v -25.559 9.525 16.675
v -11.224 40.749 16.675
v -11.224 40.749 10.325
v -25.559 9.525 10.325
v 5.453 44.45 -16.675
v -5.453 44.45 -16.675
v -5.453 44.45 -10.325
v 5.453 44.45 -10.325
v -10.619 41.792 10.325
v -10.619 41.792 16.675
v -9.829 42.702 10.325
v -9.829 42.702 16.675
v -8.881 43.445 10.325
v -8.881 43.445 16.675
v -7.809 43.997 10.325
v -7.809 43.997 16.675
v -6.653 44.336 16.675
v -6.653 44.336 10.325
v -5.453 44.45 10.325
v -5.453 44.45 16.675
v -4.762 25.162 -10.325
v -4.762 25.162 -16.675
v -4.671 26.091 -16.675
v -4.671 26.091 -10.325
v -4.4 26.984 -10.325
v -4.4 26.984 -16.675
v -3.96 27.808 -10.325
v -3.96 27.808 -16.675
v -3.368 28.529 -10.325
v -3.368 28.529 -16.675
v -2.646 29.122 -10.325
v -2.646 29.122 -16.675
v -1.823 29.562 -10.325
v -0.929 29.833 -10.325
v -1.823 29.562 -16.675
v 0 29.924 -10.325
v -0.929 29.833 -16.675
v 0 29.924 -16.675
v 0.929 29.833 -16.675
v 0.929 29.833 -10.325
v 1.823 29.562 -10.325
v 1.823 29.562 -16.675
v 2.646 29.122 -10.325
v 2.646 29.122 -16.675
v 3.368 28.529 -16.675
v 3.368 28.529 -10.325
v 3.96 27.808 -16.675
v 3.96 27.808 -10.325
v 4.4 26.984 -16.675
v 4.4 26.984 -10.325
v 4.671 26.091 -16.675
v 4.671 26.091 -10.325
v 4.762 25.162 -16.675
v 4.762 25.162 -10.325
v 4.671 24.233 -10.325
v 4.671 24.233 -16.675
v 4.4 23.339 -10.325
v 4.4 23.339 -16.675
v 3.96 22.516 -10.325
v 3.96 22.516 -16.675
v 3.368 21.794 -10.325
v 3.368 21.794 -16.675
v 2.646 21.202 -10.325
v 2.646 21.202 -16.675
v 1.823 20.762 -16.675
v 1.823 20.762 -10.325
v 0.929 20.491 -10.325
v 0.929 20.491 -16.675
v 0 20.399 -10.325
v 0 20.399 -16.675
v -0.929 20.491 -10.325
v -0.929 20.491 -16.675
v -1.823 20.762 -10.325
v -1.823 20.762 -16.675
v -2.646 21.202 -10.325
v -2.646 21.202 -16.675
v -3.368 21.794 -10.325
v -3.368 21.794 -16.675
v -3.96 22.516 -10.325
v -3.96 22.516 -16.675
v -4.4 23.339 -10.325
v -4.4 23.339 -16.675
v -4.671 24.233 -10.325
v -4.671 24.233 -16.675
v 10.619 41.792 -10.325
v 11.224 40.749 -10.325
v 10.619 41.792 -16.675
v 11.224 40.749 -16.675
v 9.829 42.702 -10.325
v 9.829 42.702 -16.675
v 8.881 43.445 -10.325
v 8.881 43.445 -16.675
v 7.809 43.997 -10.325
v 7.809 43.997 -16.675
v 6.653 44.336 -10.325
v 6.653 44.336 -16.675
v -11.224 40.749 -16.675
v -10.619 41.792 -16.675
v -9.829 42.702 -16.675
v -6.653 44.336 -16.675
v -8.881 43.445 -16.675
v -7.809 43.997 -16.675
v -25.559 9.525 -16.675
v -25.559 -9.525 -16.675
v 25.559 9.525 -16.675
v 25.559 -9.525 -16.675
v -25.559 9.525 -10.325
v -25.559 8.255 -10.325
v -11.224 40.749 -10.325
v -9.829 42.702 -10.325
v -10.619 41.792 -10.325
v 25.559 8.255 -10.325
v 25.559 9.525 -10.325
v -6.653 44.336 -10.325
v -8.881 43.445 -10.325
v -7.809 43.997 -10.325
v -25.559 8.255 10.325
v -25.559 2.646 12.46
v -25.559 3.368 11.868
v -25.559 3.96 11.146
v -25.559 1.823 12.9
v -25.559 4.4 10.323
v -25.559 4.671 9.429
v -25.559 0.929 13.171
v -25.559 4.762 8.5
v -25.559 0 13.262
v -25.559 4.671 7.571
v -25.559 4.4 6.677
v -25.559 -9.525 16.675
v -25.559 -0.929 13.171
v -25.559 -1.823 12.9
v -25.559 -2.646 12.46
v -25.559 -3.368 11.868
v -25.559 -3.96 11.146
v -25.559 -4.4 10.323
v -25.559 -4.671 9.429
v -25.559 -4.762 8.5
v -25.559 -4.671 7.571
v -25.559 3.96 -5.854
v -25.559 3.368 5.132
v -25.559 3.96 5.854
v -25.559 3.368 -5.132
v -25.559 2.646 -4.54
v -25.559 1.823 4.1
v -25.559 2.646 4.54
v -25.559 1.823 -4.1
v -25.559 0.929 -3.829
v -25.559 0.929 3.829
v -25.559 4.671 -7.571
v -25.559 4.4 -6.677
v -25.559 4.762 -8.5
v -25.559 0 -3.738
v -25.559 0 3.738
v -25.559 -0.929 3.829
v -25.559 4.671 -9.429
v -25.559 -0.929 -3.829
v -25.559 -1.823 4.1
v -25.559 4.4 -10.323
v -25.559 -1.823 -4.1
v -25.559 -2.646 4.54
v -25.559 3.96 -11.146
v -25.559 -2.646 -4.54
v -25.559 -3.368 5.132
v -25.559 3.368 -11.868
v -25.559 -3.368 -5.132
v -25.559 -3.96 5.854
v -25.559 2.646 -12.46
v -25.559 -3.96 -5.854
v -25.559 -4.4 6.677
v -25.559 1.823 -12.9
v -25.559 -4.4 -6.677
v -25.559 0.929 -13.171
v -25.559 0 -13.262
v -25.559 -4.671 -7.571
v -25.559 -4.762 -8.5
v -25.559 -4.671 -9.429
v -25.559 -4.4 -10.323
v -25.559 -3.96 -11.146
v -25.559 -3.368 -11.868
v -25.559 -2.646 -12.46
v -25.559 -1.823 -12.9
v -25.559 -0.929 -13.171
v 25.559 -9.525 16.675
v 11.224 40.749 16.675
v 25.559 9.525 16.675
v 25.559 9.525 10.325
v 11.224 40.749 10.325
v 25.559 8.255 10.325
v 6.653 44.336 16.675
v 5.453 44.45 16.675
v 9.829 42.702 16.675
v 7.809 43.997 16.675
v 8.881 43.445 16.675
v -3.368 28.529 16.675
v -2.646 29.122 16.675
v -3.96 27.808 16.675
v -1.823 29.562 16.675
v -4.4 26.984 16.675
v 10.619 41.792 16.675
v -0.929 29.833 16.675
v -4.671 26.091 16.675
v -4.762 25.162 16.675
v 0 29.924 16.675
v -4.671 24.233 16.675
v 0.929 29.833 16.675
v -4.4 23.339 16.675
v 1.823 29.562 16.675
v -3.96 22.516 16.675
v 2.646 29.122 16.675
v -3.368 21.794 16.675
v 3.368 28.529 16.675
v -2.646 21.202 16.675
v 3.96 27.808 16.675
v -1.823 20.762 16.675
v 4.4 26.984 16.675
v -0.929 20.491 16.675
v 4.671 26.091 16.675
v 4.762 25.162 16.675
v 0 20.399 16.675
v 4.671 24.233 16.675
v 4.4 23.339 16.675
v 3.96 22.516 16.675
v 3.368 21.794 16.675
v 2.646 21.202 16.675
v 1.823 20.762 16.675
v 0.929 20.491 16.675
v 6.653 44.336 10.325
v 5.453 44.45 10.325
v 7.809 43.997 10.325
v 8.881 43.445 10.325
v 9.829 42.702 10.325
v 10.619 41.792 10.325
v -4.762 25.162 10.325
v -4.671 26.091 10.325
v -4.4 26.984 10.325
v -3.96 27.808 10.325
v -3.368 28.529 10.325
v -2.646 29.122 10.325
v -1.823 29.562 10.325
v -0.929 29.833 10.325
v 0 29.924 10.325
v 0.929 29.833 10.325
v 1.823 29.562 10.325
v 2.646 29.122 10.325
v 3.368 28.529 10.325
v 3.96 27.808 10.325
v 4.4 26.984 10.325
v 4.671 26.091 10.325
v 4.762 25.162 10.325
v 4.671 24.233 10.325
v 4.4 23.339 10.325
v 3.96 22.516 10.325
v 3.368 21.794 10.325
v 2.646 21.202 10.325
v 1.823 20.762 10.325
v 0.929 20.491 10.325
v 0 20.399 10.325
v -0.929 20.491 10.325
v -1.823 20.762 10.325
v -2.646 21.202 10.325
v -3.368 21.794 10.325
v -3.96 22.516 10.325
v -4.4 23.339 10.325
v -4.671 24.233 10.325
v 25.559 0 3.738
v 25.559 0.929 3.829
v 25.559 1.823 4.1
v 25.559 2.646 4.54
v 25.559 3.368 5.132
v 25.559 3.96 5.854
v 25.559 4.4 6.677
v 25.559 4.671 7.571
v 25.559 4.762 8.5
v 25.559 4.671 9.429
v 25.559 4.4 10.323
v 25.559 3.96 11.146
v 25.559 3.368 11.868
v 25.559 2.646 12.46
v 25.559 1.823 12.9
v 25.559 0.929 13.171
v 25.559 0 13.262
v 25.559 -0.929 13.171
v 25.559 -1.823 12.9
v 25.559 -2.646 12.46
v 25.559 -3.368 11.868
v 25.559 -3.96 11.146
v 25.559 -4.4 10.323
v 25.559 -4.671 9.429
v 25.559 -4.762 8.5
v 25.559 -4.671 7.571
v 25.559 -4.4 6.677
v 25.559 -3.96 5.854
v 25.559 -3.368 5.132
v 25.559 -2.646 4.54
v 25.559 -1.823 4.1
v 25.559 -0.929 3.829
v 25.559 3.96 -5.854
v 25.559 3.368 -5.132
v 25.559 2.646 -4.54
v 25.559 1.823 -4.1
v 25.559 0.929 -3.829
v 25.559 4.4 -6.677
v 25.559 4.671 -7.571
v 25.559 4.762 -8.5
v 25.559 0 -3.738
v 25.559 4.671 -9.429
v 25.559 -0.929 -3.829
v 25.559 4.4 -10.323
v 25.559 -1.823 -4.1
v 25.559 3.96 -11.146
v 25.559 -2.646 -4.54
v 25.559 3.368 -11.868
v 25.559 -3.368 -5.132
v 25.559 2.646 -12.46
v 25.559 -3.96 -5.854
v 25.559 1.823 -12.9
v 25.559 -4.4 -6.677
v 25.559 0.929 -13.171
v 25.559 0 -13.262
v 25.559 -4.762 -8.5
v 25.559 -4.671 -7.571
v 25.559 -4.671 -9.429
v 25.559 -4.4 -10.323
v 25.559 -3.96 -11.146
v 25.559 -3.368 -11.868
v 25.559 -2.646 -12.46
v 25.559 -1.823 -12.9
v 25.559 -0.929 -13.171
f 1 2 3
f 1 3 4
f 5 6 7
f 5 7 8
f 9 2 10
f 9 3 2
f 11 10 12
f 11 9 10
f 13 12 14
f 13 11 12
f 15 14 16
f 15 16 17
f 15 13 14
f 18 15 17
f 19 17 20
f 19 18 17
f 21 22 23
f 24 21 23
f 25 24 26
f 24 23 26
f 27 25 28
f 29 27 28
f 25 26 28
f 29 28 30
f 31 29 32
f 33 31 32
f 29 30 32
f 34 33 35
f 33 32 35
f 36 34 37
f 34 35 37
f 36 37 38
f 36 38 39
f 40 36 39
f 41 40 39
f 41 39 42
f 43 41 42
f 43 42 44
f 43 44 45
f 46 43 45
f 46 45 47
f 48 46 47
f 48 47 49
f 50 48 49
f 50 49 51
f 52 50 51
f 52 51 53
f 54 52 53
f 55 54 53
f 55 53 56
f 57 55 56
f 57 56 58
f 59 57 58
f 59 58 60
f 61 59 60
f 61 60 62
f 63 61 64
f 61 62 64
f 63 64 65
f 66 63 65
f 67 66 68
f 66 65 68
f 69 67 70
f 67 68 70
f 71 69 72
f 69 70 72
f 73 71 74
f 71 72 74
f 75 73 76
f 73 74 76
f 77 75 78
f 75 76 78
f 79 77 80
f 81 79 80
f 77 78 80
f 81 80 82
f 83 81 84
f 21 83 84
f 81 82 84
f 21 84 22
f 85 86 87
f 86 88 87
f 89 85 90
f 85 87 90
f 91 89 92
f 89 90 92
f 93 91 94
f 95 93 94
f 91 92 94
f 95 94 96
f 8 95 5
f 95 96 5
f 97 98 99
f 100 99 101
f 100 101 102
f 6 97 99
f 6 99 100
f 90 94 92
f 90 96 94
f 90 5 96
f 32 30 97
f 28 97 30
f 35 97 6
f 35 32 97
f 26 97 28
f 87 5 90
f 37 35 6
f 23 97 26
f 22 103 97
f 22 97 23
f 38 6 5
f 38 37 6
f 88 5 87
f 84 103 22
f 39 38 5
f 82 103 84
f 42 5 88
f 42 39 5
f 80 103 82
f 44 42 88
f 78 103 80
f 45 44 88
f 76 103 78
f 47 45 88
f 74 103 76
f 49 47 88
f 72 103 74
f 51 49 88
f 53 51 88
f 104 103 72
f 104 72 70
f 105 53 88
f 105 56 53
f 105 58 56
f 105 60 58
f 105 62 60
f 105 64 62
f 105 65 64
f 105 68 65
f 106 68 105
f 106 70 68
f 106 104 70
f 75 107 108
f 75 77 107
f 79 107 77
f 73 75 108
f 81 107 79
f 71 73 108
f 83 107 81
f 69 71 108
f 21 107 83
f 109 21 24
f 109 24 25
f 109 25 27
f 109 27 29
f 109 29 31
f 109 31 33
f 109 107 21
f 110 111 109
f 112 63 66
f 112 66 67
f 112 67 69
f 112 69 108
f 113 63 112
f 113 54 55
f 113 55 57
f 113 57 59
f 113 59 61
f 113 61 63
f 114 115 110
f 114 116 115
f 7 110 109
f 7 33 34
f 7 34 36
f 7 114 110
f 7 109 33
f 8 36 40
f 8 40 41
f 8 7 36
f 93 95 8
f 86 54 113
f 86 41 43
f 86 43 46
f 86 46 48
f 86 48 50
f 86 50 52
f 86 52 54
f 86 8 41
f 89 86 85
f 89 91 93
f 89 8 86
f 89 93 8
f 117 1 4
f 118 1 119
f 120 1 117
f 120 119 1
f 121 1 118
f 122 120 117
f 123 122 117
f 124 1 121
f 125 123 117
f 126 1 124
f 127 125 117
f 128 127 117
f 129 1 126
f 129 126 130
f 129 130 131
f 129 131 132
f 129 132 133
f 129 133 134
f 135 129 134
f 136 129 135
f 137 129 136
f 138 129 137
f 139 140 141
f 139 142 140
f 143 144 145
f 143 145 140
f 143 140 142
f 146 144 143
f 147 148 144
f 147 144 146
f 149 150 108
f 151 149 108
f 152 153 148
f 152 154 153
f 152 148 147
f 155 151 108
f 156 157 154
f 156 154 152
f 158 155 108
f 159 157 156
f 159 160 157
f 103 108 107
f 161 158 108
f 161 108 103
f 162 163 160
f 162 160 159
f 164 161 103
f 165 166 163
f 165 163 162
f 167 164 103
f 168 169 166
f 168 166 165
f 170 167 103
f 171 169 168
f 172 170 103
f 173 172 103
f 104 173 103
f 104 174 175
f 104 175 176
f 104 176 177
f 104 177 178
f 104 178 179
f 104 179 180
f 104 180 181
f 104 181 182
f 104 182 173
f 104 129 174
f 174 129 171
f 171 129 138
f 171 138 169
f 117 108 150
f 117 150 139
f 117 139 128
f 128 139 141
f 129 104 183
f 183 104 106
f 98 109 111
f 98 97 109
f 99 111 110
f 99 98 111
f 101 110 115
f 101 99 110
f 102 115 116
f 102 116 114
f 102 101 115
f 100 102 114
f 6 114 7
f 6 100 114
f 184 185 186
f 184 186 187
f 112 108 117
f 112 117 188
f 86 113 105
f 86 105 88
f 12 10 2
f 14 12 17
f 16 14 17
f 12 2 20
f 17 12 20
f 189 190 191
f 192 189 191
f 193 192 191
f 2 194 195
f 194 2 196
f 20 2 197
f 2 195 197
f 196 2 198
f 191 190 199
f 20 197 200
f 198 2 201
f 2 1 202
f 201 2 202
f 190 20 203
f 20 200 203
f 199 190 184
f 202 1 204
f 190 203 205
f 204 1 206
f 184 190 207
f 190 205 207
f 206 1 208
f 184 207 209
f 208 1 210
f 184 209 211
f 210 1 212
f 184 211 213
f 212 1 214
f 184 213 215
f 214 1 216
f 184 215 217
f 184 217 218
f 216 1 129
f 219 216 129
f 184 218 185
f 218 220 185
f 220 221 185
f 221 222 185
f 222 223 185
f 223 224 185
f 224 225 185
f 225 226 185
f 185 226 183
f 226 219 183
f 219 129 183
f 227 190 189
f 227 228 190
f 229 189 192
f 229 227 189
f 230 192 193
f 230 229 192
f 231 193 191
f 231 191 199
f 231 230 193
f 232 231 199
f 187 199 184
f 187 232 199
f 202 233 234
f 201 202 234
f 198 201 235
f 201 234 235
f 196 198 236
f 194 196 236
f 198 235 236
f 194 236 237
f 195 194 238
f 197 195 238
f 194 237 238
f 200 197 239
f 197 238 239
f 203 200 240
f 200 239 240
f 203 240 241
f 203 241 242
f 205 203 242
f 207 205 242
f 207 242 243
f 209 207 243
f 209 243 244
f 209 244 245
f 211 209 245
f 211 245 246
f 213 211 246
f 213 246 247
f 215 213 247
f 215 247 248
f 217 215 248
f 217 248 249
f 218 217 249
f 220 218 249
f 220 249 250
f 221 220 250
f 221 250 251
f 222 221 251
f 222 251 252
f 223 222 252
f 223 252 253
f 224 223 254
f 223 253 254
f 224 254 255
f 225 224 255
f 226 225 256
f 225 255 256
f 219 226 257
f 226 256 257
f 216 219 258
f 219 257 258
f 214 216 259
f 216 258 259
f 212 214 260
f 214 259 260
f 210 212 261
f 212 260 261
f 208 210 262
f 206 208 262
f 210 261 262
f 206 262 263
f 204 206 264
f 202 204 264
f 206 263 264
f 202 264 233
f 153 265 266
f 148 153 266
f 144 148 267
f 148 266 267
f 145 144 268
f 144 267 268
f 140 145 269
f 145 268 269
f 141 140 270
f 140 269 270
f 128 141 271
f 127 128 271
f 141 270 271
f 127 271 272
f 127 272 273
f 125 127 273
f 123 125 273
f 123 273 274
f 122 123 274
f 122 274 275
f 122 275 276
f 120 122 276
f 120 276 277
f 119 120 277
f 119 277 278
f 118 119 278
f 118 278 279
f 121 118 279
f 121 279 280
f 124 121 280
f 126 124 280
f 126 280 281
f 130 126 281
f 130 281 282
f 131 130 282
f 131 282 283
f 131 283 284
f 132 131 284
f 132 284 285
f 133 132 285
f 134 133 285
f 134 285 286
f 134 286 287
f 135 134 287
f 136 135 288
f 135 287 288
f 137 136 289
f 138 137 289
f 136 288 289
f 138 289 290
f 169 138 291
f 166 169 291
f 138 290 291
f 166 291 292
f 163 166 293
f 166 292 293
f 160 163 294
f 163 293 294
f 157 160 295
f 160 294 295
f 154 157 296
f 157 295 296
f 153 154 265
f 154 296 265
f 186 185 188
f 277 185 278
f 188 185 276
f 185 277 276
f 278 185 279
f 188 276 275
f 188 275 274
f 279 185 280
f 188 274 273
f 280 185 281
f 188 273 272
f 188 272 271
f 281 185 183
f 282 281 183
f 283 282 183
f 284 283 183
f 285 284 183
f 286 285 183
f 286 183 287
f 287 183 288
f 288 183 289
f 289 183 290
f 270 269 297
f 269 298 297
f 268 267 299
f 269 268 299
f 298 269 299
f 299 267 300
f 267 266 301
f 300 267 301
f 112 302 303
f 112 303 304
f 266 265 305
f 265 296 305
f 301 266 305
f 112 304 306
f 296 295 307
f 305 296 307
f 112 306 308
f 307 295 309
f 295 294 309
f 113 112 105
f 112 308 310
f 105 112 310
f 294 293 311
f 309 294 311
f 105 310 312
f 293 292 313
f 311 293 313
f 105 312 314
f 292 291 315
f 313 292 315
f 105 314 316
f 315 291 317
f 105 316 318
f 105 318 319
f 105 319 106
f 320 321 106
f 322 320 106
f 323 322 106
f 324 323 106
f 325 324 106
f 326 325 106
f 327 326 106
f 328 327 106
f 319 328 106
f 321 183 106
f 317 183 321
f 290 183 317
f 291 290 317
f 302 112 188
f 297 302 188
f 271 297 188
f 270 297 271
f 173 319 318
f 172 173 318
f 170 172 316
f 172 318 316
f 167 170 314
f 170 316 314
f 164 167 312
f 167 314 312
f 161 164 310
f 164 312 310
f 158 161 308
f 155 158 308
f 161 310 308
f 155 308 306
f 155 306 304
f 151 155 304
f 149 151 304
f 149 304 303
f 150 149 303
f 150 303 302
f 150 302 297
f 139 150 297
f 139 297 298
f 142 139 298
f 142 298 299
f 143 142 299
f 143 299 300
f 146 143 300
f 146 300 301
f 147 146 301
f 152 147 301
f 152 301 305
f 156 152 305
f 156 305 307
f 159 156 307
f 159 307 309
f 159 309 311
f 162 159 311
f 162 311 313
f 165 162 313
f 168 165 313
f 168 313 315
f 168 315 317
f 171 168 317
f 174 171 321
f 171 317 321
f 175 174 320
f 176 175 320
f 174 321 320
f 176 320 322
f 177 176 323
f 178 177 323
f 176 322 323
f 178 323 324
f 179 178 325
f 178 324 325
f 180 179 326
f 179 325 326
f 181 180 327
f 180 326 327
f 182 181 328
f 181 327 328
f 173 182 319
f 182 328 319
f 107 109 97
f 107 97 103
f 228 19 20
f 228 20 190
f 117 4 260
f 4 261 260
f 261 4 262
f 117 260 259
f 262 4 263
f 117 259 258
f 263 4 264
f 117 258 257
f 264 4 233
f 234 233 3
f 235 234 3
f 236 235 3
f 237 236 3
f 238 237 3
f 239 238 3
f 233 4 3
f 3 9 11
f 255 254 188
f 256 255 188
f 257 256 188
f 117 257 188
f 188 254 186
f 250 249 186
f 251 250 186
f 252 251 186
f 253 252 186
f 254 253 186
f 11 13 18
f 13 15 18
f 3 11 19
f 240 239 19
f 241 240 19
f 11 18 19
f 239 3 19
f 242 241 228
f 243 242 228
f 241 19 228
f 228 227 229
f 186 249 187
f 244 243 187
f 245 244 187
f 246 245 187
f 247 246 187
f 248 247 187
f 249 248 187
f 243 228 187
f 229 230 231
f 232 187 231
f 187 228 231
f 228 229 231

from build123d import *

# Parameters (mm, degrees)
BOSS_EXTRUDE1_DEPTH          = 44.45
BOSS_EXTRUDE1_DEPTH_BACK     = 9.525
SKETCH1_W                    = 51.1175
SKETCH1_H                    = 33.3502
SKETCH2_W                    = 51.1175
SKETCH2_H                    = 20.6502
CUT_EXTRUDE1_DEPTH           = 36.195
CUT_EXTRUDE2_DEPTH           = 62.166069365
CUT_EXTRUDE2_DEPTH_BACK      = 62.166069365
FILLET3_R                    = 6.35
F_3_8_0_375_DIAMETER_HOLE1_D = 9.525
F_3_8_0_375_DIAMETER_HOLE2_D = 9.525


with BuildPart() as part:
    # Sketch1 → Boss-Extrude1 (new, two sides: drawn at the far end of the back side and taken through both)
    with BuildSketch(Plane(origin=(0, 0, 0), x_dir=(1, 0, 0), z_dir=(0, 1, 0)).offset(-BOSS_EXTRUDE1_DEPTH_BACK)):
        Rectangle(SKETCH1_W, SKETCH1_H)
    extrude(amount=BOSS_EXTRUDE1_DEPTH + BOSS_EXTRUDE1_DEPTH_BACK)

    # Sketch2 → Cut-Extrude1 (cut)
    with BuildSketch(Plane(origin=(0, 44.45, 0), x_dir=(1, 0, 0), z_dir=(0, 1, 0))):
        Rectangle(SKETCH2_W, SKETCH2_H)
    extrude(amount=-CUT_EXTRUDE1_DEPTH, mode=Mode.SUBTRACT)

    # Sketch3 → Cut-Extrude2 (cut, two sides: drawn at the far end of the back side and taken through both)
    with BuildSketch(Plane(origin=(0, 0, -16.6751), x_dir=(-1, 0, 0), z_dir=(0, 0, -1)).offset(-CUT_EXTRUDE2_DEPTH_BACK)):
        Polygon((25.55875, 44.45), (9.525, 44.45), (25.55875, 9.525), align=None)
        Polygon((-25.55875, 9.525), (-9.525, 44.45), (-25.55875, 44.45), align=None)
    extrude(amount=CUT_EXTRUDE2_DEPTH + CUT_EXTRUDE2_DEPTH_BACK, mode=Mode.SUBTRACT)

    # Fillet3
    fillet3_edges = [part.edges().sort_by_distance(p)[0] for p in [
        (-9.525, 44.45, -13.5001),
        (-9.525, 44.45, 13.5001),
        (9.525, 44.45, -13.5001),
        (9.525, 44.45, 13.5001),
    ]]
    fillet(fillet3_edges, radius=FILLET3_R)

    # 3/8 (0.375) Diameter Hole1 (through all)
    with Locations(Plane.XY.offset(16.6751)):
        with Locations((0, 25.161662577)):
            Hole(F_3_8_0_375_DIAMETER_HOLE1_D / 2)

    # 3/8 (0.375) Diameter Hole2 (through all)
    with Locations(Plane.ZY.offset(25.55875)):
        with Locations((-8.5, 0), (8.5, 0)):
            Hole(F_3_8_0_375_DIAMETER_HOLE2_D / 2)


solid = part.part
